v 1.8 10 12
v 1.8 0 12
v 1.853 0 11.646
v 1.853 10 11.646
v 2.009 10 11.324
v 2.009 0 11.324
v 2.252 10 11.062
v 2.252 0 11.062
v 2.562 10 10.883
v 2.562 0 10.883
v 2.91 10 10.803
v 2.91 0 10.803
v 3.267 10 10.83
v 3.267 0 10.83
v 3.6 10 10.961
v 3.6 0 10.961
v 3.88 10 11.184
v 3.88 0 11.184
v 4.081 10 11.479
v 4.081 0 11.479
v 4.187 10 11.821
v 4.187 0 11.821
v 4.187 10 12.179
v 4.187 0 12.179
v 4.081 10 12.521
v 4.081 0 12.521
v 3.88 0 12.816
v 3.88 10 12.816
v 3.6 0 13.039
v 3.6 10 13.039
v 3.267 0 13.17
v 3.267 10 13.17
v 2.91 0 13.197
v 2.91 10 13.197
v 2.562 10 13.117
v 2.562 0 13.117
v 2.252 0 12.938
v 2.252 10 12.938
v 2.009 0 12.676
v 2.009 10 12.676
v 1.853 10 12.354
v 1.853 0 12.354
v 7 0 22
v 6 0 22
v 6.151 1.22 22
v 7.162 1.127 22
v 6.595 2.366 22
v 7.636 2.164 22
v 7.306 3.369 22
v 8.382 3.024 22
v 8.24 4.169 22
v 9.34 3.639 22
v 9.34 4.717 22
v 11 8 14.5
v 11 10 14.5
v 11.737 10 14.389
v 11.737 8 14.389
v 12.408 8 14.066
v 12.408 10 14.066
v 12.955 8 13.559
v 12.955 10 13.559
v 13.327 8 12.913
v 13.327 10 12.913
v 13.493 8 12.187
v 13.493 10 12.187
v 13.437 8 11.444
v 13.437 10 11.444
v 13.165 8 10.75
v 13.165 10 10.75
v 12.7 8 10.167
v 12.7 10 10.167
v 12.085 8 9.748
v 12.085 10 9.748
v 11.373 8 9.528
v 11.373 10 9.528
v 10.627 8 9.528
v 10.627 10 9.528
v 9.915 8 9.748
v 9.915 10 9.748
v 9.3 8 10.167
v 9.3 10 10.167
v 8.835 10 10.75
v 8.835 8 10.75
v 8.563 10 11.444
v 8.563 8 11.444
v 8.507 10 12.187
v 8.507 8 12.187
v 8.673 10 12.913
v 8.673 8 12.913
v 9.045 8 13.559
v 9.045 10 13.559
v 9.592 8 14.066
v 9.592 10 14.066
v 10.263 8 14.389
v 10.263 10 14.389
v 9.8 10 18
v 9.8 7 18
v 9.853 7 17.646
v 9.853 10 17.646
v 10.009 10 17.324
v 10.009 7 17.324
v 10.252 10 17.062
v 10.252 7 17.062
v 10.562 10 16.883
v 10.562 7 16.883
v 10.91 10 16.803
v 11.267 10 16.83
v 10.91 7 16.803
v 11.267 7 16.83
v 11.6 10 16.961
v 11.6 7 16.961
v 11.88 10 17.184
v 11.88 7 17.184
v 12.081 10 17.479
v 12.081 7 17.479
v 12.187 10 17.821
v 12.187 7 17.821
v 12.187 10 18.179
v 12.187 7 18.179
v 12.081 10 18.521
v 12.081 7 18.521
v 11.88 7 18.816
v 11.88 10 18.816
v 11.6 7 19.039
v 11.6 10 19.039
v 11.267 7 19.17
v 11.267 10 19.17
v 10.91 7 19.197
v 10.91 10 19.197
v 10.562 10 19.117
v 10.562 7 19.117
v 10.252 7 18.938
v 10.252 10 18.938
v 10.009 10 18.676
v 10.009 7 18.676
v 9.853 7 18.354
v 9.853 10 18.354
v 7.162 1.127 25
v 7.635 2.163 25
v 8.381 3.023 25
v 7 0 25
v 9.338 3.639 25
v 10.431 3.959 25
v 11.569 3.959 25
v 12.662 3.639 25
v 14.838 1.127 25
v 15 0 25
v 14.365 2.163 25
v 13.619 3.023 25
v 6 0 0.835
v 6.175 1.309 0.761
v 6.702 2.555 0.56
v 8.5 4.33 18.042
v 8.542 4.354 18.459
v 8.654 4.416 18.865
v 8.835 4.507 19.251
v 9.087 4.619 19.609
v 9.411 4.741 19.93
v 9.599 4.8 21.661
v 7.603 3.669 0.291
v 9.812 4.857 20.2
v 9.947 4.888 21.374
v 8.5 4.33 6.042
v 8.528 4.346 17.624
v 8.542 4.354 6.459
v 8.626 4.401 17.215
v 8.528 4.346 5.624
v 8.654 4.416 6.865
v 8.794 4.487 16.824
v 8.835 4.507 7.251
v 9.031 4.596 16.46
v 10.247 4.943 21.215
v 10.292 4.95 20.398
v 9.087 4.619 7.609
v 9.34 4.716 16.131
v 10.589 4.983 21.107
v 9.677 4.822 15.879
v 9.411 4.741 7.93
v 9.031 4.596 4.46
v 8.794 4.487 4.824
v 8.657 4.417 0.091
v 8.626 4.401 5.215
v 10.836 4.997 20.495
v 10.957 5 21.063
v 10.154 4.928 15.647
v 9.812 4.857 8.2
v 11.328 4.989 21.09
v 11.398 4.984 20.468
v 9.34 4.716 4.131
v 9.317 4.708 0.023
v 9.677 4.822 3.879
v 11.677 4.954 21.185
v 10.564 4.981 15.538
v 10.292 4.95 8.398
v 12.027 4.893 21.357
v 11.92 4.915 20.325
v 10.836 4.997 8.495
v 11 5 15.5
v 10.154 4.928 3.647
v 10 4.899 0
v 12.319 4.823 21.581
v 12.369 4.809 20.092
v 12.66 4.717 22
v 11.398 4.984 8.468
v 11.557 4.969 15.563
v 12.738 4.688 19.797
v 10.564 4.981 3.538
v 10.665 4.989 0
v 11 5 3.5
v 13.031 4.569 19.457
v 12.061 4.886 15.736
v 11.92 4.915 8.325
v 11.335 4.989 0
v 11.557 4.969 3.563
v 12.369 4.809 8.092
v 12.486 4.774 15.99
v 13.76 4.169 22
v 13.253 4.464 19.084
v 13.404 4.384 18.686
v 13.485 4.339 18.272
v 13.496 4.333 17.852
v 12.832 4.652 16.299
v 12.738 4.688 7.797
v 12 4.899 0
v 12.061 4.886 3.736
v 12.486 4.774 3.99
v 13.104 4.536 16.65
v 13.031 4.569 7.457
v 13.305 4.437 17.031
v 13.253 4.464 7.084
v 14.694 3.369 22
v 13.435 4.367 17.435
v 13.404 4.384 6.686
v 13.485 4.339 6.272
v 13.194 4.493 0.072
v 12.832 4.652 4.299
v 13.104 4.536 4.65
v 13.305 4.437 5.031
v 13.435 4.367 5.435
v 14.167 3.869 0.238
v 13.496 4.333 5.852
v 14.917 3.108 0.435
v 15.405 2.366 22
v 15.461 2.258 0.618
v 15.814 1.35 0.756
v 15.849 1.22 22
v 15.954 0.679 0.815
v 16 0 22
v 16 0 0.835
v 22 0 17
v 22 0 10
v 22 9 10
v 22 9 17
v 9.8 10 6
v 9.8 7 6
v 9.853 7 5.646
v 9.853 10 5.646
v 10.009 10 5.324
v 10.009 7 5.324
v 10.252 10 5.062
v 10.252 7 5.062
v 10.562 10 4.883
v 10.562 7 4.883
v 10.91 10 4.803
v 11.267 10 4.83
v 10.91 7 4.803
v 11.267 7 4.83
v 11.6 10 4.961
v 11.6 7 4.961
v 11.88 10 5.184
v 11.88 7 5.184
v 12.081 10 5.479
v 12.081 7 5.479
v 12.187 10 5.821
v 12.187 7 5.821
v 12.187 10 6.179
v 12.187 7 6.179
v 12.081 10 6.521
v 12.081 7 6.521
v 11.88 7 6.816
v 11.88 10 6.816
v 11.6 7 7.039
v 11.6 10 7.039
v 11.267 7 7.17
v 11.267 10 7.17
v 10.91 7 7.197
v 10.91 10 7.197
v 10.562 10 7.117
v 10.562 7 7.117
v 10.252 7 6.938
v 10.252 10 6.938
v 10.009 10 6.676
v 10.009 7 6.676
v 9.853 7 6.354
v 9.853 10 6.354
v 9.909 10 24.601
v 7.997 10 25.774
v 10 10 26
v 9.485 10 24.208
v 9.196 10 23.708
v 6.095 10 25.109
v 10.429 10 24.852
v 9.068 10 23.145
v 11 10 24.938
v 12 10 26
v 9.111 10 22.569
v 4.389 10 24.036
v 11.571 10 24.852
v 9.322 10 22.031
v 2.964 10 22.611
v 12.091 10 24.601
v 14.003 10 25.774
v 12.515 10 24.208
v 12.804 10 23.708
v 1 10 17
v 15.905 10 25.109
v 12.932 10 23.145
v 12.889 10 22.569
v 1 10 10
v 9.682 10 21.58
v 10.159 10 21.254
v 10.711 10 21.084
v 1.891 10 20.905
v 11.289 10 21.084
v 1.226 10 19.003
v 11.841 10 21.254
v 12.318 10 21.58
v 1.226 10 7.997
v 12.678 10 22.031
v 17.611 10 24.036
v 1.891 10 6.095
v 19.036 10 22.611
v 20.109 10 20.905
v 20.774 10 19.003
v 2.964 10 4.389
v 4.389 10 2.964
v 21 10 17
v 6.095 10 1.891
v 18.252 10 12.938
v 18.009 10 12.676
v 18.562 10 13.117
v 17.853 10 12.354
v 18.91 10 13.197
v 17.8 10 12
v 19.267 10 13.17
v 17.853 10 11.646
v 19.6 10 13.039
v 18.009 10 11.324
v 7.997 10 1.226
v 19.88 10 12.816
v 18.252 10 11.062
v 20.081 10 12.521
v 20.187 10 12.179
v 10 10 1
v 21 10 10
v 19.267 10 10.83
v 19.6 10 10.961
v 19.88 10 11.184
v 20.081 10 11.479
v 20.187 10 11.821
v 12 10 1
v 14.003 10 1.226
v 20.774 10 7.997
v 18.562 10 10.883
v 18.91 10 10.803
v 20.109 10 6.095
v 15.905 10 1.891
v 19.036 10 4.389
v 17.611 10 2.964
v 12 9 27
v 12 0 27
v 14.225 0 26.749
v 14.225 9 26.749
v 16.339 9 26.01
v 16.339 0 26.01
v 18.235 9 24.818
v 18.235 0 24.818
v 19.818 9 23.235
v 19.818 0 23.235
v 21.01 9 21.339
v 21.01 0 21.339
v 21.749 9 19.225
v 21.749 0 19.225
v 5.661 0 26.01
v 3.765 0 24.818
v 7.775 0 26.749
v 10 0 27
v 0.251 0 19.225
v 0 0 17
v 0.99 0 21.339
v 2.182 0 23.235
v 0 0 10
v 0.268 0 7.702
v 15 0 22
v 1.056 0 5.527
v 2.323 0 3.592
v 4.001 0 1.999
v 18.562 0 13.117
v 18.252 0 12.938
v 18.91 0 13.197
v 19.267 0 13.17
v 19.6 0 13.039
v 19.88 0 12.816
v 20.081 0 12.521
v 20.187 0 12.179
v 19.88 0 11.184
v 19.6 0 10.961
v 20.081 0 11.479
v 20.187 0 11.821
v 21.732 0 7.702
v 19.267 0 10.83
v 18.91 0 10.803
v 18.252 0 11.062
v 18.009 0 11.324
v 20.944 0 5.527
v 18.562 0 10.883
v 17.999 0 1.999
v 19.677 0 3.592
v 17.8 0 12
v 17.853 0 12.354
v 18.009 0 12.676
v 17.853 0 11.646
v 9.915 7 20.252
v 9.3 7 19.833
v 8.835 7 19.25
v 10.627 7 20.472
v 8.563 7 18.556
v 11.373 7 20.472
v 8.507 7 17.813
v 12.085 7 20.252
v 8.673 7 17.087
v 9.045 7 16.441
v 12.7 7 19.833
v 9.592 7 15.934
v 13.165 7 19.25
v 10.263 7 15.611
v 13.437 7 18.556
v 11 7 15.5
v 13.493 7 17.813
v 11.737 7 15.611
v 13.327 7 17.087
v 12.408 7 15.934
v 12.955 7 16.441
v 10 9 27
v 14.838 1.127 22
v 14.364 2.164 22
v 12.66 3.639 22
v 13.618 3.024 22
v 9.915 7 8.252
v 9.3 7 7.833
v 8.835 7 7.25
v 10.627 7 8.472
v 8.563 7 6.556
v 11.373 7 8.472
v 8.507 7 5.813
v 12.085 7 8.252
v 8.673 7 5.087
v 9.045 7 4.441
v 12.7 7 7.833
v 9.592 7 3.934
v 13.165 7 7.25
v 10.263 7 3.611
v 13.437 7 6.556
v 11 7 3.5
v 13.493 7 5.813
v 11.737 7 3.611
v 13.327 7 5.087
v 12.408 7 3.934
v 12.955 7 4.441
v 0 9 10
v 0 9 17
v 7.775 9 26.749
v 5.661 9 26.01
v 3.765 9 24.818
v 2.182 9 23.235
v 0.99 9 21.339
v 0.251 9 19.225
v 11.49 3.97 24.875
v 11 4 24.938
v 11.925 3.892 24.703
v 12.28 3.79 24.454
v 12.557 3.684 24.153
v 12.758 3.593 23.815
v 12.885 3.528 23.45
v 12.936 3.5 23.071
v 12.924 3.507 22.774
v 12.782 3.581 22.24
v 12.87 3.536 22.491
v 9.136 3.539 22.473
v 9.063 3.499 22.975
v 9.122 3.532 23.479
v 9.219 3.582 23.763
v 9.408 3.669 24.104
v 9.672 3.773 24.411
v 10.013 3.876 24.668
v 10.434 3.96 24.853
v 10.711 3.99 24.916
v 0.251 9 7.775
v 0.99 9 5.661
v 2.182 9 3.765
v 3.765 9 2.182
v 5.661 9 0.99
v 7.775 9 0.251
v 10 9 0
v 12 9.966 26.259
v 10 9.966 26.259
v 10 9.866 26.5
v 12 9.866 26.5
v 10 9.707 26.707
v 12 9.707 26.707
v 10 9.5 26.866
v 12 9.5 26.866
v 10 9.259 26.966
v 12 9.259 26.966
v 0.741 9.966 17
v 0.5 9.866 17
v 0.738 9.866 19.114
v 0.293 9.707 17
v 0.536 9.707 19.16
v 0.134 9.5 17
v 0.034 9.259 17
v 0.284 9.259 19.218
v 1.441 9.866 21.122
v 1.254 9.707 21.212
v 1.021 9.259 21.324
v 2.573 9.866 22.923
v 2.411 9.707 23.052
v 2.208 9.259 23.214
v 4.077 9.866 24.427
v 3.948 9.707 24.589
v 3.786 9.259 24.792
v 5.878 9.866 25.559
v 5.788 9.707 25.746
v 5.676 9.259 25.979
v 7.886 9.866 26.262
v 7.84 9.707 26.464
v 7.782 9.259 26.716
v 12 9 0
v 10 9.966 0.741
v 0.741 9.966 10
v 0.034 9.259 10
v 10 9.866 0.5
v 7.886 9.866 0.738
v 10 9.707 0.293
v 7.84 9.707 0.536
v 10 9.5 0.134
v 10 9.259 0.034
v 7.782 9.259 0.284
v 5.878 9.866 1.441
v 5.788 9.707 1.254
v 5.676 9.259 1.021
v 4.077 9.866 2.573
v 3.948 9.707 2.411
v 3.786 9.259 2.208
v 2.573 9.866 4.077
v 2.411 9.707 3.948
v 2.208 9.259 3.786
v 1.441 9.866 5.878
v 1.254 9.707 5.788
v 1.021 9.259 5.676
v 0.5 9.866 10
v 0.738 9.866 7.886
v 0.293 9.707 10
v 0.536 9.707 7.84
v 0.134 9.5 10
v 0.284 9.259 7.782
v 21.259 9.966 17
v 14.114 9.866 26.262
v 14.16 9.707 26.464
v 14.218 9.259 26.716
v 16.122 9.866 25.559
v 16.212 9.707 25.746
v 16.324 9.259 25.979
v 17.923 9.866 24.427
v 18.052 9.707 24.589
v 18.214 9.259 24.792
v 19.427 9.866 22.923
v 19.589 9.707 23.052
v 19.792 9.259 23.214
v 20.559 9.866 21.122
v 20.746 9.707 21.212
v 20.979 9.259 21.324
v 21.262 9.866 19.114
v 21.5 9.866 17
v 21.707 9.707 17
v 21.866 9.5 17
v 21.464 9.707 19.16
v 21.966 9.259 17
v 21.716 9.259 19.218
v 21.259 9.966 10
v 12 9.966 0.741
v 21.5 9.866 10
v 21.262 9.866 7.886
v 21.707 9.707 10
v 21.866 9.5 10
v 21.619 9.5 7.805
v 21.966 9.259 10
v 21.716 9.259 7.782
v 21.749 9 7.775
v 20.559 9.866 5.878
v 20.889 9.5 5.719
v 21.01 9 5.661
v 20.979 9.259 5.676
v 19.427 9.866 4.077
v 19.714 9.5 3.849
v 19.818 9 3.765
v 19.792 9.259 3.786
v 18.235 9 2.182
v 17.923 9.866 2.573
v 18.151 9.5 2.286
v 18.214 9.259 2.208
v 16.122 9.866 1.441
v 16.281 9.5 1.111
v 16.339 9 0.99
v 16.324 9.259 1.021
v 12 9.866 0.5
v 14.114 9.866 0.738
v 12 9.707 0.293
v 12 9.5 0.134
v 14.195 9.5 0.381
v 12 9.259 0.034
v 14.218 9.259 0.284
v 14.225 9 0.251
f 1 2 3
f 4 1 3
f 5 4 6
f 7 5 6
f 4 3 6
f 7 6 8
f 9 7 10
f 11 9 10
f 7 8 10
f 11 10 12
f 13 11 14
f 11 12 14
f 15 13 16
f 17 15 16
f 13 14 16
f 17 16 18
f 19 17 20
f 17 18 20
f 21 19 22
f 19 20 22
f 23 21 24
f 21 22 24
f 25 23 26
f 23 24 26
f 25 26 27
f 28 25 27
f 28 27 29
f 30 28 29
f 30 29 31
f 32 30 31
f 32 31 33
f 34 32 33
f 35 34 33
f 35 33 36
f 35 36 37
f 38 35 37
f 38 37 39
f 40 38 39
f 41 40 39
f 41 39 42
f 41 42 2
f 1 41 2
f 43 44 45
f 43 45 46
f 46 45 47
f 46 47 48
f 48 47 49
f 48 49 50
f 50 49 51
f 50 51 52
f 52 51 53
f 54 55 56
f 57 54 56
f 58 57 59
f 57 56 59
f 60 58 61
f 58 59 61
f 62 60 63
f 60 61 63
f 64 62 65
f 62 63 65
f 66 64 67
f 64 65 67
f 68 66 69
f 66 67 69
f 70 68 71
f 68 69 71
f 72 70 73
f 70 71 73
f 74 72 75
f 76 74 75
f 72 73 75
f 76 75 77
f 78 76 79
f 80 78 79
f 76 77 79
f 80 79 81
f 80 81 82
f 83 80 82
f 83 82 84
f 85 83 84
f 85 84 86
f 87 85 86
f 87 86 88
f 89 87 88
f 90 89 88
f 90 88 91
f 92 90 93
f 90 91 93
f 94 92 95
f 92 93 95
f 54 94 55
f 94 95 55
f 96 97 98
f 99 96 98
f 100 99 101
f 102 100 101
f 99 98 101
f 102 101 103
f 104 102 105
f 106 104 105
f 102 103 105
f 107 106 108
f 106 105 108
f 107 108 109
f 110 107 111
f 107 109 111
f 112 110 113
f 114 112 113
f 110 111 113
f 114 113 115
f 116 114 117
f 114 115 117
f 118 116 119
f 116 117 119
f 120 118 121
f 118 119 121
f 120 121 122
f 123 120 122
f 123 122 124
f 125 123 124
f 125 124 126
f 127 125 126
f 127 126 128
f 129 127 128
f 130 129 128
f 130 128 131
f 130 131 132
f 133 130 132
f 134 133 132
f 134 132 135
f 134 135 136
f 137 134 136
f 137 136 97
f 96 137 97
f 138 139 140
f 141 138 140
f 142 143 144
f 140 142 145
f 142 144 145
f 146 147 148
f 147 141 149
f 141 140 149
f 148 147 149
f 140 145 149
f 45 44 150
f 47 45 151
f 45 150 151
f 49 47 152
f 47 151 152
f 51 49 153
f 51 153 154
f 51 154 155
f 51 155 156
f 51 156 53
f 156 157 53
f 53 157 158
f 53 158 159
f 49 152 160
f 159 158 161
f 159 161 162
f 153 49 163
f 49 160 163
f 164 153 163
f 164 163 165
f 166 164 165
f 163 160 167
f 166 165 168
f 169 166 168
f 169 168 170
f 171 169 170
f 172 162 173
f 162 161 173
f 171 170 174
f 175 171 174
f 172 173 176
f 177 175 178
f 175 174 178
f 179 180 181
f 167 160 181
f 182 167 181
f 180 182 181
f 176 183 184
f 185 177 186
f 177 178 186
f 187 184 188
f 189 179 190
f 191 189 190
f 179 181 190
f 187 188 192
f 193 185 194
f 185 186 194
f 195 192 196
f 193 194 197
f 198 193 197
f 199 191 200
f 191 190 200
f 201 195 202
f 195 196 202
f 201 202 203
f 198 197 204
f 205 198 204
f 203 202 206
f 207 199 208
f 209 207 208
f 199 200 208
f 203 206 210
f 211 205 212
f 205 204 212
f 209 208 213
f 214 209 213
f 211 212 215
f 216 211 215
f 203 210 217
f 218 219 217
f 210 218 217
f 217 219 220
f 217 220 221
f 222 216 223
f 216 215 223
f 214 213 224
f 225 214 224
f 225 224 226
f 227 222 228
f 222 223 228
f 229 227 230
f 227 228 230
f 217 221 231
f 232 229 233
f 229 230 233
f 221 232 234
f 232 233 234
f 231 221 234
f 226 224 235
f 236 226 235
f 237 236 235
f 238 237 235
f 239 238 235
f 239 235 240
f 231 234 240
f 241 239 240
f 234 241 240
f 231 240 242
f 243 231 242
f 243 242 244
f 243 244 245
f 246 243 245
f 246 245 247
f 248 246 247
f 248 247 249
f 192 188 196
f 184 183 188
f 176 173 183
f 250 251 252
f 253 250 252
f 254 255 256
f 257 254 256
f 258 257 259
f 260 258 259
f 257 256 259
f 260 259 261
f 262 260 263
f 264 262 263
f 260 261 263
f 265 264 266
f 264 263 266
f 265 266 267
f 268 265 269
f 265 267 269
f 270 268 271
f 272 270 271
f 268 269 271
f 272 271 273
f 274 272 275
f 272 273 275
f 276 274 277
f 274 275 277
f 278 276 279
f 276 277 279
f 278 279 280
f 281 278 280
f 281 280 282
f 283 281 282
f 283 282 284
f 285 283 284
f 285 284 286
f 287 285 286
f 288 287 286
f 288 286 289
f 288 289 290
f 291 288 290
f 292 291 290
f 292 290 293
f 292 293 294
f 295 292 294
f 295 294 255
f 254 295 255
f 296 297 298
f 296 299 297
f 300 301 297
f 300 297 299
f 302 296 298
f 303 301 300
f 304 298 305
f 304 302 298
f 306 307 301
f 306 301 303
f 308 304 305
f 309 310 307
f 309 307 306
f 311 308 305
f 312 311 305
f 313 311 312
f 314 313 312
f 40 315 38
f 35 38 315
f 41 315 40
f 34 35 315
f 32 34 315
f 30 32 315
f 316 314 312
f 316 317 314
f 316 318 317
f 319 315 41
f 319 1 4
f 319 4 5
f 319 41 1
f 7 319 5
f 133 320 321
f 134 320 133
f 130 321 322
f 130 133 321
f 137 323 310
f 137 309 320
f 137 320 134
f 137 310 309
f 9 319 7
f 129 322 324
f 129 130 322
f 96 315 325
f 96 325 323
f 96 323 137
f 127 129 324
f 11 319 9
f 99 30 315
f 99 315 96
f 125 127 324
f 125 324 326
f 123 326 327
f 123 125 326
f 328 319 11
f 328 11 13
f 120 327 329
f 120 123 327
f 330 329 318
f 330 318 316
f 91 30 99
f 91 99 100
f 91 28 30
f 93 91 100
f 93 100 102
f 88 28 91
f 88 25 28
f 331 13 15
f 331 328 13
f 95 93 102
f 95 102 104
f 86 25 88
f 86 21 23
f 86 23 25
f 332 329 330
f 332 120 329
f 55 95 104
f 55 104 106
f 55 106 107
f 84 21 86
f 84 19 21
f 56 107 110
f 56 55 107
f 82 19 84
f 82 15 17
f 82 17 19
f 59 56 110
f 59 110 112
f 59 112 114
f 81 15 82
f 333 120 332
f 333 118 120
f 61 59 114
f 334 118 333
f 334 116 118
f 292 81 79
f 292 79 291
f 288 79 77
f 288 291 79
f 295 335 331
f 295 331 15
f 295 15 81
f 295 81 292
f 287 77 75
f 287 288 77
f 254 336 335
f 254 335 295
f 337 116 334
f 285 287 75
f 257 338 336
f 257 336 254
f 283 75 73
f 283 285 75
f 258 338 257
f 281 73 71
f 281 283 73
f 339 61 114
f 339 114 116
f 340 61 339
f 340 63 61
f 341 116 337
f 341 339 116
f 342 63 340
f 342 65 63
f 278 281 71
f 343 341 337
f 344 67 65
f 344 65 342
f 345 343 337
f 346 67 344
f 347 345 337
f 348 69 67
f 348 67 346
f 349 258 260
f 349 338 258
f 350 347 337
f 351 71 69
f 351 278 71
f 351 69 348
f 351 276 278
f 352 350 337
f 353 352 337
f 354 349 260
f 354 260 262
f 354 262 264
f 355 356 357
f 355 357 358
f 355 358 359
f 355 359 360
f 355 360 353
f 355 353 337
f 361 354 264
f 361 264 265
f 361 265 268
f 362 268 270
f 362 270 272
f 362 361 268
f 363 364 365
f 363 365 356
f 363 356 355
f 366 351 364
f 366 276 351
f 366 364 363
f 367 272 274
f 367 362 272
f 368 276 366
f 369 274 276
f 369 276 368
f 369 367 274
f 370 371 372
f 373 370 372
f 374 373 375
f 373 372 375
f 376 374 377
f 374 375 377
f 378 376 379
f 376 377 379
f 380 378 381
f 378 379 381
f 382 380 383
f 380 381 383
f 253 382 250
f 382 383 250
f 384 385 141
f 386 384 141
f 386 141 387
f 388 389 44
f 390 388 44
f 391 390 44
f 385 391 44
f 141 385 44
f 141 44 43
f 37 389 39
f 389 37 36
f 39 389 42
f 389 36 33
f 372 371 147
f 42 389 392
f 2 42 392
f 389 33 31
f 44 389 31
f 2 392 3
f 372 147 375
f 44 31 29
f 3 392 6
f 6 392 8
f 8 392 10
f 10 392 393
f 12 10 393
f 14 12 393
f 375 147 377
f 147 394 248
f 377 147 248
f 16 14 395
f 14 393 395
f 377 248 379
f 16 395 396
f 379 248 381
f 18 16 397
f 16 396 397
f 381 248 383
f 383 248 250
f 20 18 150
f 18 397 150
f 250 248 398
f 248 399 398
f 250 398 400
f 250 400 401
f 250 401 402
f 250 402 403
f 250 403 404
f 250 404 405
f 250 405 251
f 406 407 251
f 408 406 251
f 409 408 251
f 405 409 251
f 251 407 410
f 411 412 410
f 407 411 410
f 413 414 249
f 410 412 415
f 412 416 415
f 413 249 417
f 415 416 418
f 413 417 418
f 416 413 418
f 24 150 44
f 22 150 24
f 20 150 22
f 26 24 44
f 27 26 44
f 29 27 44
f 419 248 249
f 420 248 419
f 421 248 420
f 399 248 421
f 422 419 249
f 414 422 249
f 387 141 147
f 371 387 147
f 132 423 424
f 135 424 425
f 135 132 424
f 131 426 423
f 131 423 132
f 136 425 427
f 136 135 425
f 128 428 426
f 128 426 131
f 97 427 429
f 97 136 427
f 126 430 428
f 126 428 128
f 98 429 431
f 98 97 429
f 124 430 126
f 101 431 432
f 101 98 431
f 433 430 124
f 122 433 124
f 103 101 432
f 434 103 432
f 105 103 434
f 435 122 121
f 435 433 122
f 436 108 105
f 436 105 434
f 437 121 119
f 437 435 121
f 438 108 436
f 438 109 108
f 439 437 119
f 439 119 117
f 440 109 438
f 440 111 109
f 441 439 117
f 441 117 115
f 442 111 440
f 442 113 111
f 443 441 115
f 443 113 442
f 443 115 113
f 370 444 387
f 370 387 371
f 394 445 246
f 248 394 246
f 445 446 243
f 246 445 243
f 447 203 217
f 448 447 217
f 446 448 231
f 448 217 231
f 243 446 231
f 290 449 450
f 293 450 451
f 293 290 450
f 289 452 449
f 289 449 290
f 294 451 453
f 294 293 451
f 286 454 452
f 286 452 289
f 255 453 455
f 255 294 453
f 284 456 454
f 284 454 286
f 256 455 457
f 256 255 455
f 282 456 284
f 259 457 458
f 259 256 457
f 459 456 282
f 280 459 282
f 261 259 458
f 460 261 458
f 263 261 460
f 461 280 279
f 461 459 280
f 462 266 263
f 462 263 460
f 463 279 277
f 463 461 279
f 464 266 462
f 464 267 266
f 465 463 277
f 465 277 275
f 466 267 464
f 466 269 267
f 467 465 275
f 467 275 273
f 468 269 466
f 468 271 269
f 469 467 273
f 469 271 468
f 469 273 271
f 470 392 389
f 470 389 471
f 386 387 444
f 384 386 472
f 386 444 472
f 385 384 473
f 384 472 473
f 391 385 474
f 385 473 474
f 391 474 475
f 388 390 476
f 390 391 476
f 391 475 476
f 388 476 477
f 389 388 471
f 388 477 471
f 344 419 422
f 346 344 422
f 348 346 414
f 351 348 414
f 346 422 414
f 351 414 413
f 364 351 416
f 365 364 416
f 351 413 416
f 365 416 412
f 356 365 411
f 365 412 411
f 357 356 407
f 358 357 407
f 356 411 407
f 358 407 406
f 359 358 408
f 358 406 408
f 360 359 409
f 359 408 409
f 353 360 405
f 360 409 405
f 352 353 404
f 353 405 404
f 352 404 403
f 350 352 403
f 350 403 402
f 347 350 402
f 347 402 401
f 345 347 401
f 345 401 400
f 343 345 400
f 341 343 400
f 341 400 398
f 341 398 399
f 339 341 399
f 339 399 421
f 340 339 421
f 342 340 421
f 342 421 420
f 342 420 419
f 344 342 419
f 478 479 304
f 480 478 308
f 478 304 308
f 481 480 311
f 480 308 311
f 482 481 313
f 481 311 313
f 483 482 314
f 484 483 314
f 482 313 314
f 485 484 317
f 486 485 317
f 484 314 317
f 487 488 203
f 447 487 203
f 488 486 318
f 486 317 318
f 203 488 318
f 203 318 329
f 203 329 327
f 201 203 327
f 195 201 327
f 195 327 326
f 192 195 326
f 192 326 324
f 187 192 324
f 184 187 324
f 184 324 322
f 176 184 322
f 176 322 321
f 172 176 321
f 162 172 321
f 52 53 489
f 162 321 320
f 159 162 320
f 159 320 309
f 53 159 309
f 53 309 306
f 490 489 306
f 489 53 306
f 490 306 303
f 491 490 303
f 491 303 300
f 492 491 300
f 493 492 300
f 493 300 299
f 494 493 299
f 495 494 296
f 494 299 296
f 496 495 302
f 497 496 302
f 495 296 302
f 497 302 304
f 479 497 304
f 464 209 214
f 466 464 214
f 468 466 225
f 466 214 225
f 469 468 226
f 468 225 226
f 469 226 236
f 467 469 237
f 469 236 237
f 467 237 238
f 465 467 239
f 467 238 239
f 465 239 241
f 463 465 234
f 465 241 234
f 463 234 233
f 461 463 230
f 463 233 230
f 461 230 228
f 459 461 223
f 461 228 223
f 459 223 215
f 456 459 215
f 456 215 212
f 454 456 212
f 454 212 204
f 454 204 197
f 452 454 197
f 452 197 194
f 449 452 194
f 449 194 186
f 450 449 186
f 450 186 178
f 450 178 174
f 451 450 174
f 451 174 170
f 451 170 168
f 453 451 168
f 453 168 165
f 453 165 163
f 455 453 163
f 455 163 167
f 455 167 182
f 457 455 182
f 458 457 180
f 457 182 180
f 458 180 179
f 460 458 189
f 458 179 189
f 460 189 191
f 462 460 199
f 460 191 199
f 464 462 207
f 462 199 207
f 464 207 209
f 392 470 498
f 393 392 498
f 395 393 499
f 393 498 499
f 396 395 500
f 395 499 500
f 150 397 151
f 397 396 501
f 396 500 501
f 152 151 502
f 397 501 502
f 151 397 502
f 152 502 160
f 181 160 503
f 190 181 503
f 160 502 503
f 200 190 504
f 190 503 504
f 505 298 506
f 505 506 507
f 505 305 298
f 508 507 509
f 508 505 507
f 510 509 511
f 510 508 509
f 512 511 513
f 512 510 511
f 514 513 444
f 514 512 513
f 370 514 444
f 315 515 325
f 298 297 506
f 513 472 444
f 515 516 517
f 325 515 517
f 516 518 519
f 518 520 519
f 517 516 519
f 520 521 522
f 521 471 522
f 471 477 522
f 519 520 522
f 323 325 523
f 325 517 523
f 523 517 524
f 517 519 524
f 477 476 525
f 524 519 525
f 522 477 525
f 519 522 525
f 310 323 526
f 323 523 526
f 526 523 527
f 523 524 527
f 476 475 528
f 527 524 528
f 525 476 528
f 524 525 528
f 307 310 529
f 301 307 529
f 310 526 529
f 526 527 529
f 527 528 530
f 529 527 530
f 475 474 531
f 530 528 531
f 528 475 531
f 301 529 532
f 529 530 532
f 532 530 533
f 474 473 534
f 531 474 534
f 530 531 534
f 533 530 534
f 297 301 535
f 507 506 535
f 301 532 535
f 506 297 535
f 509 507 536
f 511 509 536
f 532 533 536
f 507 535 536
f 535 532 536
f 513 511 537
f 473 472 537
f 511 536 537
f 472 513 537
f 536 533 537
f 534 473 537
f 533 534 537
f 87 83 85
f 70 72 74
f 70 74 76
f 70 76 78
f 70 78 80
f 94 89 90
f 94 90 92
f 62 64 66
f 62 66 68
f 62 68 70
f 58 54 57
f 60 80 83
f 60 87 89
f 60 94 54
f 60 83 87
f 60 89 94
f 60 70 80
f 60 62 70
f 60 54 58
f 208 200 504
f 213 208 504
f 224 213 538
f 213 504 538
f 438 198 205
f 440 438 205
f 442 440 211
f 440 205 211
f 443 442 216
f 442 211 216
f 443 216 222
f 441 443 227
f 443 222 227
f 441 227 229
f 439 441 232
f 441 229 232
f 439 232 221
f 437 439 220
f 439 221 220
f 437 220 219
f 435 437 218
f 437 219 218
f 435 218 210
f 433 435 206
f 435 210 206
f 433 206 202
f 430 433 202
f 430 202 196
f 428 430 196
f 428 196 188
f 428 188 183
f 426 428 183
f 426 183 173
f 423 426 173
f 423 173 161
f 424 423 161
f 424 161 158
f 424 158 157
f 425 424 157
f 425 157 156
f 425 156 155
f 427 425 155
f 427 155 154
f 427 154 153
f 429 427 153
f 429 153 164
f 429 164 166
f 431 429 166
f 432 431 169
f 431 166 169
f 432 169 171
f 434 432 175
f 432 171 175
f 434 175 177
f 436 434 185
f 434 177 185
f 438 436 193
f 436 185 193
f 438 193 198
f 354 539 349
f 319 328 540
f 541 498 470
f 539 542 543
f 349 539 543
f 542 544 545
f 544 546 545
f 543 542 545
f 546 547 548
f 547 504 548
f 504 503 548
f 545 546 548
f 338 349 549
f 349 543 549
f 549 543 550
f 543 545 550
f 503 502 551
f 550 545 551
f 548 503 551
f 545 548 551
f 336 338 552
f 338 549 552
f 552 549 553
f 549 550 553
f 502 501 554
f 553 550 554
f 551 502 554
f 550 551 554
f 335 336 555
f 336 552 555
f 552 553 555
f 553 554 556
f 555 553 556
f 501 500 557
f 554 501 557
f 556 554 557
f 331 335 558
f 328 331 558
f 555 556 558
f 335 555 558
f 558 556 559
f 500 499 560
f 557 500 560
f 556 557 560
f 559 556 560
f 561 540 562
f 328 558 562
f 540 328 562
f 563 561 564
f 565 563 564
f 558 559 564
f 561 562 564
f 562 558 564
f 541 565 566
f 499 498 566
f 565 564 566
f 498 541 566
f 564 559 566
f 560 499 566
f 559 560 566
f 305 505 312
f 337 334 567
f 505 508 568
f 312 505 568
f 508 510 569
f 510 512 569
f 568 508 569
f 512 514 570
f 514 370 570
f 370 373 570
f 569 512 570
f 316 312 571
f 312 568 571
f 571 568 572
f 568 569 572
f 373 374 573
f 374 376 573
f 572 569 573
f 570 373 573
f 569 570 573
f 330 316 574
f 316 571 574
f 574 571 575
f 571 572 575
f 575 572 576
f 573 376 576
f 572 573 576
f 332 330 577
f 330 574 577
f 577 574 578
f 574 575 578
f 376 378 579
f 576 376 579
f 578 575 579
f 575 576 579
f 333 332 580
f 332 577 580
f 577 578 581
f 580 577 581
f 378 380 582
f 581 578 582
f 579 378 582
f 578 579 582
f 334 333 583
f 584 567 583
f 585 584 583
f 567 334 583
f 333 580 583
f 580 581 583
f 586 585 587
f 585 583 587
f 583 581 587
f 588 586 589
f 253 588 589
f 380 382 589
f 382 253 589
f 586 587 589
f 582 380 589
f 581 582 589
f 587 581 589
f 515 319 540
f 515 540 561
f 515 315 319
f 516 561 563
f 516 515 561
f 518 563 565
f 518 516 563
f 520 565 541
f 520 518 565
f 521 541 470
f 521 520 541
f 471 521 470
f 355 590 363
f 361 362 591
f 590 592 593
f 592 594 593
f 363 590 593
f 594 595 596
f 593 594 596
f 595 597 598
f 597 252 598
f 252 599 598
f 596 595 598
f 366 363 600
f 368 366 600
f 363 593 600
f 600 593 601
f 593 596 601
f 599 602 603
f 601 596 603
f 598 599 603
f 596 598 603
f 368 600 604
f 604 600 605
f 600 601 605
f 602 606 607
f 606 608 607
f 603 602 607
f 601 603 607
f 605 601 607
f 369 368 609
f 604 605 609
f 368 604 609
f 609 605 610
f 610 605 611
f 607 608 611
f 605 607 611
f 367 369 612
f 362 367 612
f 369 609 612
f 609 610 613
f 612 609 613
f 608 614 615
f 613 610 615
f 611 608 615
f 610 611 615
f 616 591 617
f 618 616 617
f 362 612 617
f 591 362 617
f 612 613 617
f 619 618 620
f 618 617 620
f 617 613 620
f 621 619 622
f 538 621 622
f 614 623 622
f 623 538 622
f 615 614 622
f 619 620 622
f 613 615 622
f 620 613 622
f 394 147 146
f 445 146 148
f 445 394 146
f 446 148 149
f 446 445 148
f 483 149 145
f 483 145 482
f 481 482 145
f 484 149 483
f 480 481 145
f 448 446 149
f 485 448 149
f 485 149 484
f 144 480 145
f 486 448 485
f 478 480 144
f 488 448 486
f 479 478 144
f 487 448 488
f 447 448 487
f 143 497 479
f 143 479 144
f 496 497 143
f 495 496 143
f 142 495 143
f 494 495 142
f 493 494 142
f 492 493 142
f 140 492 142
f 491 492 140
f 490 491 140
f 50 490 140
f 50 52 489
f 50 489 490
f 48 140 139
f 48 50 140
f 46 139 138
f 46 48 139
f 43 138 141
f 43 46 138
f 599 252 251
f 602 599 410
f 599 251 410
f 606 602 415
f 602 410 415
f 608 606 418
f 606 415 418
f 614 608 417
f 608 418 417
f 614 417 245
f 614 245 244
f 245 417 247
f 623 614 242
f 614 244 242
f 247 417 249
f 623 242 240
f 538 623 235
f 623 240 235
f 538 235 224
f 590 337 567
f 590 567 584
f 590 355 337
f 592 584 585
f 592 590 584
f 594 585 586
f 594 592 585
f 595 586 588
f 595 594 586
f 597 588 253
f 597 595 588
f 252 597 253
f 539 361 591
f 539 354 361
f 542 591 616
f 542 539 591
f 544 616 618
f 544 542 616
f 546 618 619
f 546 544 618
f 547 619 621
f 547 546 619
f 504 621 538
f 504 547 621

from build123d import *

# Parameters (mm, degrees)
BOSS_EXTRU_1_DEPTH      = 22
D_GAGEMENT_M21_D        = 2.4
ESQUISSE5_W             = 22
ESQUISSE5_H             = 10
BOSS_EXTRU_2_DEPTH      = 5
CONG_1_R                = 10
CONG_3_R                = 1
ENL_V_MAT_EXTRU_2_DEPTH = 3
ESQUISSE12_R            = 1.9376057
ENL_V_MAT_EXTRU_3_DEPTH = 37.235341952
ESQUISSE13_R            = 2.5
ENL_V_MAT_EXTRU_4_DEPTH = 2
ESQUISSE15_R            = 2.5
ENL_V_MAT_EXTRU_5_DEPTH = 7


with BuildPart() as part:
    # Esquisse1 → Boss.-Extru.1 (new body)
    with BuildSketch(Plane.XY):
        with BuildLine():
            Line((0, 10), (0, 0))
            Line((0, 0), (6, 0))
            ThreePointArc((6, 0), (11, 5), (16, 0))
            Line((16, 0), (22, 0))
            Line((22, 0), (22, 10))
            Line((22, 10), (0, 10))
        make_face()
    extrude(amount=BOSS_EXTRU_1_DEPTH)

    # Dégagement M21 (through all)
    with Locations(Plane(origin=(0, 10, 0), x_dir=(1, 0, 0), z_dir=(0, 1, 0))):
        with Locations((11, -6), (11, -18), (3, -12), (19, -12)):
            Hole(D_GAGEMENT_M21_D / 2)

    # Esquisse5 → Boss.-Extru.2 (add)
    with BuildSketch(Plane.XY.offset(22)):
        with Locations((11, 5)):
            Rectangle(ESQUISSE5_W, ESQUISSE5_H)
    extrude(amount=BOSS_EXTRU_2_DEPTH)

    # Congé1
    # the kernel refuses this fillet: 10 mm, written as the material it takes off along each edge
    with BuildSketch(Plane(origin=(0, 35, 0), x_dir=(0, 0, 1), z_dir=(0, -1, 0))) as cong_1_piece_1:
        with BuildLine():
            CenterArc((CONG_1_R, -CONG_1_R), CONG_1_R, 90, 90)
            Line((0, -CONG_1_R), (0, 0))
            Line((0, 0), (CONG_1_R, 0))
        make_face()
    extrude(amount=60, mode=Mode.SUBTRACT)
    with BuildSketch(Plane(origin=(0, 35, 27), x_dir=(0, 0, -1), z_dir=(0, -1, 0)), Plane(origin=(22, -25, 0), x_dir=(-1, 0, 0), z_dir=(0, 1, 0)), Plane(origin=(22, -25, 27), x_dir=(0, 0, -1), z_dir=(0, 1, 0))) as cong_1_piece_2:
        with BuildLine():
            CenterArc((CONG_1_R, CONG_1_R), CONG_1_R, 180, 90)
            Line((0, CONG_1_R), (0, 0))
            Line((0, 0), (CONG_1_R, 0))
        make_face()
    extrude(amount=60, mode=Mode.SUBTRACT)

    # Congé3
    cong_3_edges = [part.edges().sort_by_distance(p)[0] for p in [
        (11, 10, 0),
        (0, 10, 13.5),
        (11, 10, 27),
        (22, 10, 13.5),
        (19.071067812, 10, 24.071067812),
        (19.071067812, 10, 2.928932188),
        (2.928932188, 10, 24.071067812),
        (2.928932188, 10, 2.928932188),
    ]]
    fillet(cong_3_edges, radius=CONG_3_R)

    # Esquisse10 → Enlèv. mat.-Extru.2 (cut)
    with BuildSketch(Plane(origin=(0, 0, 22), x_dir=(-1, 0, 0), z_dir=(0, 0, -1))):
        with BuildLine():
            Line((-7, 0), (-15, 0))
            ThreePointArc((-15, 0), (-11, 4), (-7, 0))
        make_face()
    extrude(amount=-ENL_V_MAT_EXTRU_2_DEPTH, mode=Mode.SUBTRACT)

    # Esquisse12 → Enlèv. mat.-Extru.3 (cut, through all)
    with BuildSketch(Plane(origin=(0, 10, 0), x_dir=(1, 0, 0), z_dir=(0, 1, 0))):
        with Locations(Location((11, -23, 0), (0, 0, 270))):
            Circle(ESQUISSE12_R)
    extrude(amount=-ENL_V_MAT_EXTRU_3_DEPTH, mode=Mode.SUBTRACT)

    # Esquisse13 → Enlèv. mat.-Extru.4 (cut)
    with BuildSketch(Plane(origin=(0, 10, 0), x_dir=(1, 0, 0), z_dir=(0, 1, 0))):
        with Locations(Location((11, -12, 0), (0, 0, 270))):
            Circle(ESQUISSE13_R)
    extrude(amount=-ENL_V_MAT_EXTRU_4_DEPTH, mode=Mode.SUBTRACT)

    # Esquisse15 → Enlèv. mat.-Extru.5 (cut)
    with BuildSketch(Plane.XZ):
        with Locations(Location((11, 18, 0), (0, 0, 270))):
            Circle(ESQUISSE15_R)
        with Locations(Location((11, 6, 0), (0, 0, 270))):
            Circle(ESQUISSE15_R)
    extrude(amount=-ENL_V_MAT_EXTRU_5_DEPTH, mode=Mode.SUBTRACT)


solid = part.part
